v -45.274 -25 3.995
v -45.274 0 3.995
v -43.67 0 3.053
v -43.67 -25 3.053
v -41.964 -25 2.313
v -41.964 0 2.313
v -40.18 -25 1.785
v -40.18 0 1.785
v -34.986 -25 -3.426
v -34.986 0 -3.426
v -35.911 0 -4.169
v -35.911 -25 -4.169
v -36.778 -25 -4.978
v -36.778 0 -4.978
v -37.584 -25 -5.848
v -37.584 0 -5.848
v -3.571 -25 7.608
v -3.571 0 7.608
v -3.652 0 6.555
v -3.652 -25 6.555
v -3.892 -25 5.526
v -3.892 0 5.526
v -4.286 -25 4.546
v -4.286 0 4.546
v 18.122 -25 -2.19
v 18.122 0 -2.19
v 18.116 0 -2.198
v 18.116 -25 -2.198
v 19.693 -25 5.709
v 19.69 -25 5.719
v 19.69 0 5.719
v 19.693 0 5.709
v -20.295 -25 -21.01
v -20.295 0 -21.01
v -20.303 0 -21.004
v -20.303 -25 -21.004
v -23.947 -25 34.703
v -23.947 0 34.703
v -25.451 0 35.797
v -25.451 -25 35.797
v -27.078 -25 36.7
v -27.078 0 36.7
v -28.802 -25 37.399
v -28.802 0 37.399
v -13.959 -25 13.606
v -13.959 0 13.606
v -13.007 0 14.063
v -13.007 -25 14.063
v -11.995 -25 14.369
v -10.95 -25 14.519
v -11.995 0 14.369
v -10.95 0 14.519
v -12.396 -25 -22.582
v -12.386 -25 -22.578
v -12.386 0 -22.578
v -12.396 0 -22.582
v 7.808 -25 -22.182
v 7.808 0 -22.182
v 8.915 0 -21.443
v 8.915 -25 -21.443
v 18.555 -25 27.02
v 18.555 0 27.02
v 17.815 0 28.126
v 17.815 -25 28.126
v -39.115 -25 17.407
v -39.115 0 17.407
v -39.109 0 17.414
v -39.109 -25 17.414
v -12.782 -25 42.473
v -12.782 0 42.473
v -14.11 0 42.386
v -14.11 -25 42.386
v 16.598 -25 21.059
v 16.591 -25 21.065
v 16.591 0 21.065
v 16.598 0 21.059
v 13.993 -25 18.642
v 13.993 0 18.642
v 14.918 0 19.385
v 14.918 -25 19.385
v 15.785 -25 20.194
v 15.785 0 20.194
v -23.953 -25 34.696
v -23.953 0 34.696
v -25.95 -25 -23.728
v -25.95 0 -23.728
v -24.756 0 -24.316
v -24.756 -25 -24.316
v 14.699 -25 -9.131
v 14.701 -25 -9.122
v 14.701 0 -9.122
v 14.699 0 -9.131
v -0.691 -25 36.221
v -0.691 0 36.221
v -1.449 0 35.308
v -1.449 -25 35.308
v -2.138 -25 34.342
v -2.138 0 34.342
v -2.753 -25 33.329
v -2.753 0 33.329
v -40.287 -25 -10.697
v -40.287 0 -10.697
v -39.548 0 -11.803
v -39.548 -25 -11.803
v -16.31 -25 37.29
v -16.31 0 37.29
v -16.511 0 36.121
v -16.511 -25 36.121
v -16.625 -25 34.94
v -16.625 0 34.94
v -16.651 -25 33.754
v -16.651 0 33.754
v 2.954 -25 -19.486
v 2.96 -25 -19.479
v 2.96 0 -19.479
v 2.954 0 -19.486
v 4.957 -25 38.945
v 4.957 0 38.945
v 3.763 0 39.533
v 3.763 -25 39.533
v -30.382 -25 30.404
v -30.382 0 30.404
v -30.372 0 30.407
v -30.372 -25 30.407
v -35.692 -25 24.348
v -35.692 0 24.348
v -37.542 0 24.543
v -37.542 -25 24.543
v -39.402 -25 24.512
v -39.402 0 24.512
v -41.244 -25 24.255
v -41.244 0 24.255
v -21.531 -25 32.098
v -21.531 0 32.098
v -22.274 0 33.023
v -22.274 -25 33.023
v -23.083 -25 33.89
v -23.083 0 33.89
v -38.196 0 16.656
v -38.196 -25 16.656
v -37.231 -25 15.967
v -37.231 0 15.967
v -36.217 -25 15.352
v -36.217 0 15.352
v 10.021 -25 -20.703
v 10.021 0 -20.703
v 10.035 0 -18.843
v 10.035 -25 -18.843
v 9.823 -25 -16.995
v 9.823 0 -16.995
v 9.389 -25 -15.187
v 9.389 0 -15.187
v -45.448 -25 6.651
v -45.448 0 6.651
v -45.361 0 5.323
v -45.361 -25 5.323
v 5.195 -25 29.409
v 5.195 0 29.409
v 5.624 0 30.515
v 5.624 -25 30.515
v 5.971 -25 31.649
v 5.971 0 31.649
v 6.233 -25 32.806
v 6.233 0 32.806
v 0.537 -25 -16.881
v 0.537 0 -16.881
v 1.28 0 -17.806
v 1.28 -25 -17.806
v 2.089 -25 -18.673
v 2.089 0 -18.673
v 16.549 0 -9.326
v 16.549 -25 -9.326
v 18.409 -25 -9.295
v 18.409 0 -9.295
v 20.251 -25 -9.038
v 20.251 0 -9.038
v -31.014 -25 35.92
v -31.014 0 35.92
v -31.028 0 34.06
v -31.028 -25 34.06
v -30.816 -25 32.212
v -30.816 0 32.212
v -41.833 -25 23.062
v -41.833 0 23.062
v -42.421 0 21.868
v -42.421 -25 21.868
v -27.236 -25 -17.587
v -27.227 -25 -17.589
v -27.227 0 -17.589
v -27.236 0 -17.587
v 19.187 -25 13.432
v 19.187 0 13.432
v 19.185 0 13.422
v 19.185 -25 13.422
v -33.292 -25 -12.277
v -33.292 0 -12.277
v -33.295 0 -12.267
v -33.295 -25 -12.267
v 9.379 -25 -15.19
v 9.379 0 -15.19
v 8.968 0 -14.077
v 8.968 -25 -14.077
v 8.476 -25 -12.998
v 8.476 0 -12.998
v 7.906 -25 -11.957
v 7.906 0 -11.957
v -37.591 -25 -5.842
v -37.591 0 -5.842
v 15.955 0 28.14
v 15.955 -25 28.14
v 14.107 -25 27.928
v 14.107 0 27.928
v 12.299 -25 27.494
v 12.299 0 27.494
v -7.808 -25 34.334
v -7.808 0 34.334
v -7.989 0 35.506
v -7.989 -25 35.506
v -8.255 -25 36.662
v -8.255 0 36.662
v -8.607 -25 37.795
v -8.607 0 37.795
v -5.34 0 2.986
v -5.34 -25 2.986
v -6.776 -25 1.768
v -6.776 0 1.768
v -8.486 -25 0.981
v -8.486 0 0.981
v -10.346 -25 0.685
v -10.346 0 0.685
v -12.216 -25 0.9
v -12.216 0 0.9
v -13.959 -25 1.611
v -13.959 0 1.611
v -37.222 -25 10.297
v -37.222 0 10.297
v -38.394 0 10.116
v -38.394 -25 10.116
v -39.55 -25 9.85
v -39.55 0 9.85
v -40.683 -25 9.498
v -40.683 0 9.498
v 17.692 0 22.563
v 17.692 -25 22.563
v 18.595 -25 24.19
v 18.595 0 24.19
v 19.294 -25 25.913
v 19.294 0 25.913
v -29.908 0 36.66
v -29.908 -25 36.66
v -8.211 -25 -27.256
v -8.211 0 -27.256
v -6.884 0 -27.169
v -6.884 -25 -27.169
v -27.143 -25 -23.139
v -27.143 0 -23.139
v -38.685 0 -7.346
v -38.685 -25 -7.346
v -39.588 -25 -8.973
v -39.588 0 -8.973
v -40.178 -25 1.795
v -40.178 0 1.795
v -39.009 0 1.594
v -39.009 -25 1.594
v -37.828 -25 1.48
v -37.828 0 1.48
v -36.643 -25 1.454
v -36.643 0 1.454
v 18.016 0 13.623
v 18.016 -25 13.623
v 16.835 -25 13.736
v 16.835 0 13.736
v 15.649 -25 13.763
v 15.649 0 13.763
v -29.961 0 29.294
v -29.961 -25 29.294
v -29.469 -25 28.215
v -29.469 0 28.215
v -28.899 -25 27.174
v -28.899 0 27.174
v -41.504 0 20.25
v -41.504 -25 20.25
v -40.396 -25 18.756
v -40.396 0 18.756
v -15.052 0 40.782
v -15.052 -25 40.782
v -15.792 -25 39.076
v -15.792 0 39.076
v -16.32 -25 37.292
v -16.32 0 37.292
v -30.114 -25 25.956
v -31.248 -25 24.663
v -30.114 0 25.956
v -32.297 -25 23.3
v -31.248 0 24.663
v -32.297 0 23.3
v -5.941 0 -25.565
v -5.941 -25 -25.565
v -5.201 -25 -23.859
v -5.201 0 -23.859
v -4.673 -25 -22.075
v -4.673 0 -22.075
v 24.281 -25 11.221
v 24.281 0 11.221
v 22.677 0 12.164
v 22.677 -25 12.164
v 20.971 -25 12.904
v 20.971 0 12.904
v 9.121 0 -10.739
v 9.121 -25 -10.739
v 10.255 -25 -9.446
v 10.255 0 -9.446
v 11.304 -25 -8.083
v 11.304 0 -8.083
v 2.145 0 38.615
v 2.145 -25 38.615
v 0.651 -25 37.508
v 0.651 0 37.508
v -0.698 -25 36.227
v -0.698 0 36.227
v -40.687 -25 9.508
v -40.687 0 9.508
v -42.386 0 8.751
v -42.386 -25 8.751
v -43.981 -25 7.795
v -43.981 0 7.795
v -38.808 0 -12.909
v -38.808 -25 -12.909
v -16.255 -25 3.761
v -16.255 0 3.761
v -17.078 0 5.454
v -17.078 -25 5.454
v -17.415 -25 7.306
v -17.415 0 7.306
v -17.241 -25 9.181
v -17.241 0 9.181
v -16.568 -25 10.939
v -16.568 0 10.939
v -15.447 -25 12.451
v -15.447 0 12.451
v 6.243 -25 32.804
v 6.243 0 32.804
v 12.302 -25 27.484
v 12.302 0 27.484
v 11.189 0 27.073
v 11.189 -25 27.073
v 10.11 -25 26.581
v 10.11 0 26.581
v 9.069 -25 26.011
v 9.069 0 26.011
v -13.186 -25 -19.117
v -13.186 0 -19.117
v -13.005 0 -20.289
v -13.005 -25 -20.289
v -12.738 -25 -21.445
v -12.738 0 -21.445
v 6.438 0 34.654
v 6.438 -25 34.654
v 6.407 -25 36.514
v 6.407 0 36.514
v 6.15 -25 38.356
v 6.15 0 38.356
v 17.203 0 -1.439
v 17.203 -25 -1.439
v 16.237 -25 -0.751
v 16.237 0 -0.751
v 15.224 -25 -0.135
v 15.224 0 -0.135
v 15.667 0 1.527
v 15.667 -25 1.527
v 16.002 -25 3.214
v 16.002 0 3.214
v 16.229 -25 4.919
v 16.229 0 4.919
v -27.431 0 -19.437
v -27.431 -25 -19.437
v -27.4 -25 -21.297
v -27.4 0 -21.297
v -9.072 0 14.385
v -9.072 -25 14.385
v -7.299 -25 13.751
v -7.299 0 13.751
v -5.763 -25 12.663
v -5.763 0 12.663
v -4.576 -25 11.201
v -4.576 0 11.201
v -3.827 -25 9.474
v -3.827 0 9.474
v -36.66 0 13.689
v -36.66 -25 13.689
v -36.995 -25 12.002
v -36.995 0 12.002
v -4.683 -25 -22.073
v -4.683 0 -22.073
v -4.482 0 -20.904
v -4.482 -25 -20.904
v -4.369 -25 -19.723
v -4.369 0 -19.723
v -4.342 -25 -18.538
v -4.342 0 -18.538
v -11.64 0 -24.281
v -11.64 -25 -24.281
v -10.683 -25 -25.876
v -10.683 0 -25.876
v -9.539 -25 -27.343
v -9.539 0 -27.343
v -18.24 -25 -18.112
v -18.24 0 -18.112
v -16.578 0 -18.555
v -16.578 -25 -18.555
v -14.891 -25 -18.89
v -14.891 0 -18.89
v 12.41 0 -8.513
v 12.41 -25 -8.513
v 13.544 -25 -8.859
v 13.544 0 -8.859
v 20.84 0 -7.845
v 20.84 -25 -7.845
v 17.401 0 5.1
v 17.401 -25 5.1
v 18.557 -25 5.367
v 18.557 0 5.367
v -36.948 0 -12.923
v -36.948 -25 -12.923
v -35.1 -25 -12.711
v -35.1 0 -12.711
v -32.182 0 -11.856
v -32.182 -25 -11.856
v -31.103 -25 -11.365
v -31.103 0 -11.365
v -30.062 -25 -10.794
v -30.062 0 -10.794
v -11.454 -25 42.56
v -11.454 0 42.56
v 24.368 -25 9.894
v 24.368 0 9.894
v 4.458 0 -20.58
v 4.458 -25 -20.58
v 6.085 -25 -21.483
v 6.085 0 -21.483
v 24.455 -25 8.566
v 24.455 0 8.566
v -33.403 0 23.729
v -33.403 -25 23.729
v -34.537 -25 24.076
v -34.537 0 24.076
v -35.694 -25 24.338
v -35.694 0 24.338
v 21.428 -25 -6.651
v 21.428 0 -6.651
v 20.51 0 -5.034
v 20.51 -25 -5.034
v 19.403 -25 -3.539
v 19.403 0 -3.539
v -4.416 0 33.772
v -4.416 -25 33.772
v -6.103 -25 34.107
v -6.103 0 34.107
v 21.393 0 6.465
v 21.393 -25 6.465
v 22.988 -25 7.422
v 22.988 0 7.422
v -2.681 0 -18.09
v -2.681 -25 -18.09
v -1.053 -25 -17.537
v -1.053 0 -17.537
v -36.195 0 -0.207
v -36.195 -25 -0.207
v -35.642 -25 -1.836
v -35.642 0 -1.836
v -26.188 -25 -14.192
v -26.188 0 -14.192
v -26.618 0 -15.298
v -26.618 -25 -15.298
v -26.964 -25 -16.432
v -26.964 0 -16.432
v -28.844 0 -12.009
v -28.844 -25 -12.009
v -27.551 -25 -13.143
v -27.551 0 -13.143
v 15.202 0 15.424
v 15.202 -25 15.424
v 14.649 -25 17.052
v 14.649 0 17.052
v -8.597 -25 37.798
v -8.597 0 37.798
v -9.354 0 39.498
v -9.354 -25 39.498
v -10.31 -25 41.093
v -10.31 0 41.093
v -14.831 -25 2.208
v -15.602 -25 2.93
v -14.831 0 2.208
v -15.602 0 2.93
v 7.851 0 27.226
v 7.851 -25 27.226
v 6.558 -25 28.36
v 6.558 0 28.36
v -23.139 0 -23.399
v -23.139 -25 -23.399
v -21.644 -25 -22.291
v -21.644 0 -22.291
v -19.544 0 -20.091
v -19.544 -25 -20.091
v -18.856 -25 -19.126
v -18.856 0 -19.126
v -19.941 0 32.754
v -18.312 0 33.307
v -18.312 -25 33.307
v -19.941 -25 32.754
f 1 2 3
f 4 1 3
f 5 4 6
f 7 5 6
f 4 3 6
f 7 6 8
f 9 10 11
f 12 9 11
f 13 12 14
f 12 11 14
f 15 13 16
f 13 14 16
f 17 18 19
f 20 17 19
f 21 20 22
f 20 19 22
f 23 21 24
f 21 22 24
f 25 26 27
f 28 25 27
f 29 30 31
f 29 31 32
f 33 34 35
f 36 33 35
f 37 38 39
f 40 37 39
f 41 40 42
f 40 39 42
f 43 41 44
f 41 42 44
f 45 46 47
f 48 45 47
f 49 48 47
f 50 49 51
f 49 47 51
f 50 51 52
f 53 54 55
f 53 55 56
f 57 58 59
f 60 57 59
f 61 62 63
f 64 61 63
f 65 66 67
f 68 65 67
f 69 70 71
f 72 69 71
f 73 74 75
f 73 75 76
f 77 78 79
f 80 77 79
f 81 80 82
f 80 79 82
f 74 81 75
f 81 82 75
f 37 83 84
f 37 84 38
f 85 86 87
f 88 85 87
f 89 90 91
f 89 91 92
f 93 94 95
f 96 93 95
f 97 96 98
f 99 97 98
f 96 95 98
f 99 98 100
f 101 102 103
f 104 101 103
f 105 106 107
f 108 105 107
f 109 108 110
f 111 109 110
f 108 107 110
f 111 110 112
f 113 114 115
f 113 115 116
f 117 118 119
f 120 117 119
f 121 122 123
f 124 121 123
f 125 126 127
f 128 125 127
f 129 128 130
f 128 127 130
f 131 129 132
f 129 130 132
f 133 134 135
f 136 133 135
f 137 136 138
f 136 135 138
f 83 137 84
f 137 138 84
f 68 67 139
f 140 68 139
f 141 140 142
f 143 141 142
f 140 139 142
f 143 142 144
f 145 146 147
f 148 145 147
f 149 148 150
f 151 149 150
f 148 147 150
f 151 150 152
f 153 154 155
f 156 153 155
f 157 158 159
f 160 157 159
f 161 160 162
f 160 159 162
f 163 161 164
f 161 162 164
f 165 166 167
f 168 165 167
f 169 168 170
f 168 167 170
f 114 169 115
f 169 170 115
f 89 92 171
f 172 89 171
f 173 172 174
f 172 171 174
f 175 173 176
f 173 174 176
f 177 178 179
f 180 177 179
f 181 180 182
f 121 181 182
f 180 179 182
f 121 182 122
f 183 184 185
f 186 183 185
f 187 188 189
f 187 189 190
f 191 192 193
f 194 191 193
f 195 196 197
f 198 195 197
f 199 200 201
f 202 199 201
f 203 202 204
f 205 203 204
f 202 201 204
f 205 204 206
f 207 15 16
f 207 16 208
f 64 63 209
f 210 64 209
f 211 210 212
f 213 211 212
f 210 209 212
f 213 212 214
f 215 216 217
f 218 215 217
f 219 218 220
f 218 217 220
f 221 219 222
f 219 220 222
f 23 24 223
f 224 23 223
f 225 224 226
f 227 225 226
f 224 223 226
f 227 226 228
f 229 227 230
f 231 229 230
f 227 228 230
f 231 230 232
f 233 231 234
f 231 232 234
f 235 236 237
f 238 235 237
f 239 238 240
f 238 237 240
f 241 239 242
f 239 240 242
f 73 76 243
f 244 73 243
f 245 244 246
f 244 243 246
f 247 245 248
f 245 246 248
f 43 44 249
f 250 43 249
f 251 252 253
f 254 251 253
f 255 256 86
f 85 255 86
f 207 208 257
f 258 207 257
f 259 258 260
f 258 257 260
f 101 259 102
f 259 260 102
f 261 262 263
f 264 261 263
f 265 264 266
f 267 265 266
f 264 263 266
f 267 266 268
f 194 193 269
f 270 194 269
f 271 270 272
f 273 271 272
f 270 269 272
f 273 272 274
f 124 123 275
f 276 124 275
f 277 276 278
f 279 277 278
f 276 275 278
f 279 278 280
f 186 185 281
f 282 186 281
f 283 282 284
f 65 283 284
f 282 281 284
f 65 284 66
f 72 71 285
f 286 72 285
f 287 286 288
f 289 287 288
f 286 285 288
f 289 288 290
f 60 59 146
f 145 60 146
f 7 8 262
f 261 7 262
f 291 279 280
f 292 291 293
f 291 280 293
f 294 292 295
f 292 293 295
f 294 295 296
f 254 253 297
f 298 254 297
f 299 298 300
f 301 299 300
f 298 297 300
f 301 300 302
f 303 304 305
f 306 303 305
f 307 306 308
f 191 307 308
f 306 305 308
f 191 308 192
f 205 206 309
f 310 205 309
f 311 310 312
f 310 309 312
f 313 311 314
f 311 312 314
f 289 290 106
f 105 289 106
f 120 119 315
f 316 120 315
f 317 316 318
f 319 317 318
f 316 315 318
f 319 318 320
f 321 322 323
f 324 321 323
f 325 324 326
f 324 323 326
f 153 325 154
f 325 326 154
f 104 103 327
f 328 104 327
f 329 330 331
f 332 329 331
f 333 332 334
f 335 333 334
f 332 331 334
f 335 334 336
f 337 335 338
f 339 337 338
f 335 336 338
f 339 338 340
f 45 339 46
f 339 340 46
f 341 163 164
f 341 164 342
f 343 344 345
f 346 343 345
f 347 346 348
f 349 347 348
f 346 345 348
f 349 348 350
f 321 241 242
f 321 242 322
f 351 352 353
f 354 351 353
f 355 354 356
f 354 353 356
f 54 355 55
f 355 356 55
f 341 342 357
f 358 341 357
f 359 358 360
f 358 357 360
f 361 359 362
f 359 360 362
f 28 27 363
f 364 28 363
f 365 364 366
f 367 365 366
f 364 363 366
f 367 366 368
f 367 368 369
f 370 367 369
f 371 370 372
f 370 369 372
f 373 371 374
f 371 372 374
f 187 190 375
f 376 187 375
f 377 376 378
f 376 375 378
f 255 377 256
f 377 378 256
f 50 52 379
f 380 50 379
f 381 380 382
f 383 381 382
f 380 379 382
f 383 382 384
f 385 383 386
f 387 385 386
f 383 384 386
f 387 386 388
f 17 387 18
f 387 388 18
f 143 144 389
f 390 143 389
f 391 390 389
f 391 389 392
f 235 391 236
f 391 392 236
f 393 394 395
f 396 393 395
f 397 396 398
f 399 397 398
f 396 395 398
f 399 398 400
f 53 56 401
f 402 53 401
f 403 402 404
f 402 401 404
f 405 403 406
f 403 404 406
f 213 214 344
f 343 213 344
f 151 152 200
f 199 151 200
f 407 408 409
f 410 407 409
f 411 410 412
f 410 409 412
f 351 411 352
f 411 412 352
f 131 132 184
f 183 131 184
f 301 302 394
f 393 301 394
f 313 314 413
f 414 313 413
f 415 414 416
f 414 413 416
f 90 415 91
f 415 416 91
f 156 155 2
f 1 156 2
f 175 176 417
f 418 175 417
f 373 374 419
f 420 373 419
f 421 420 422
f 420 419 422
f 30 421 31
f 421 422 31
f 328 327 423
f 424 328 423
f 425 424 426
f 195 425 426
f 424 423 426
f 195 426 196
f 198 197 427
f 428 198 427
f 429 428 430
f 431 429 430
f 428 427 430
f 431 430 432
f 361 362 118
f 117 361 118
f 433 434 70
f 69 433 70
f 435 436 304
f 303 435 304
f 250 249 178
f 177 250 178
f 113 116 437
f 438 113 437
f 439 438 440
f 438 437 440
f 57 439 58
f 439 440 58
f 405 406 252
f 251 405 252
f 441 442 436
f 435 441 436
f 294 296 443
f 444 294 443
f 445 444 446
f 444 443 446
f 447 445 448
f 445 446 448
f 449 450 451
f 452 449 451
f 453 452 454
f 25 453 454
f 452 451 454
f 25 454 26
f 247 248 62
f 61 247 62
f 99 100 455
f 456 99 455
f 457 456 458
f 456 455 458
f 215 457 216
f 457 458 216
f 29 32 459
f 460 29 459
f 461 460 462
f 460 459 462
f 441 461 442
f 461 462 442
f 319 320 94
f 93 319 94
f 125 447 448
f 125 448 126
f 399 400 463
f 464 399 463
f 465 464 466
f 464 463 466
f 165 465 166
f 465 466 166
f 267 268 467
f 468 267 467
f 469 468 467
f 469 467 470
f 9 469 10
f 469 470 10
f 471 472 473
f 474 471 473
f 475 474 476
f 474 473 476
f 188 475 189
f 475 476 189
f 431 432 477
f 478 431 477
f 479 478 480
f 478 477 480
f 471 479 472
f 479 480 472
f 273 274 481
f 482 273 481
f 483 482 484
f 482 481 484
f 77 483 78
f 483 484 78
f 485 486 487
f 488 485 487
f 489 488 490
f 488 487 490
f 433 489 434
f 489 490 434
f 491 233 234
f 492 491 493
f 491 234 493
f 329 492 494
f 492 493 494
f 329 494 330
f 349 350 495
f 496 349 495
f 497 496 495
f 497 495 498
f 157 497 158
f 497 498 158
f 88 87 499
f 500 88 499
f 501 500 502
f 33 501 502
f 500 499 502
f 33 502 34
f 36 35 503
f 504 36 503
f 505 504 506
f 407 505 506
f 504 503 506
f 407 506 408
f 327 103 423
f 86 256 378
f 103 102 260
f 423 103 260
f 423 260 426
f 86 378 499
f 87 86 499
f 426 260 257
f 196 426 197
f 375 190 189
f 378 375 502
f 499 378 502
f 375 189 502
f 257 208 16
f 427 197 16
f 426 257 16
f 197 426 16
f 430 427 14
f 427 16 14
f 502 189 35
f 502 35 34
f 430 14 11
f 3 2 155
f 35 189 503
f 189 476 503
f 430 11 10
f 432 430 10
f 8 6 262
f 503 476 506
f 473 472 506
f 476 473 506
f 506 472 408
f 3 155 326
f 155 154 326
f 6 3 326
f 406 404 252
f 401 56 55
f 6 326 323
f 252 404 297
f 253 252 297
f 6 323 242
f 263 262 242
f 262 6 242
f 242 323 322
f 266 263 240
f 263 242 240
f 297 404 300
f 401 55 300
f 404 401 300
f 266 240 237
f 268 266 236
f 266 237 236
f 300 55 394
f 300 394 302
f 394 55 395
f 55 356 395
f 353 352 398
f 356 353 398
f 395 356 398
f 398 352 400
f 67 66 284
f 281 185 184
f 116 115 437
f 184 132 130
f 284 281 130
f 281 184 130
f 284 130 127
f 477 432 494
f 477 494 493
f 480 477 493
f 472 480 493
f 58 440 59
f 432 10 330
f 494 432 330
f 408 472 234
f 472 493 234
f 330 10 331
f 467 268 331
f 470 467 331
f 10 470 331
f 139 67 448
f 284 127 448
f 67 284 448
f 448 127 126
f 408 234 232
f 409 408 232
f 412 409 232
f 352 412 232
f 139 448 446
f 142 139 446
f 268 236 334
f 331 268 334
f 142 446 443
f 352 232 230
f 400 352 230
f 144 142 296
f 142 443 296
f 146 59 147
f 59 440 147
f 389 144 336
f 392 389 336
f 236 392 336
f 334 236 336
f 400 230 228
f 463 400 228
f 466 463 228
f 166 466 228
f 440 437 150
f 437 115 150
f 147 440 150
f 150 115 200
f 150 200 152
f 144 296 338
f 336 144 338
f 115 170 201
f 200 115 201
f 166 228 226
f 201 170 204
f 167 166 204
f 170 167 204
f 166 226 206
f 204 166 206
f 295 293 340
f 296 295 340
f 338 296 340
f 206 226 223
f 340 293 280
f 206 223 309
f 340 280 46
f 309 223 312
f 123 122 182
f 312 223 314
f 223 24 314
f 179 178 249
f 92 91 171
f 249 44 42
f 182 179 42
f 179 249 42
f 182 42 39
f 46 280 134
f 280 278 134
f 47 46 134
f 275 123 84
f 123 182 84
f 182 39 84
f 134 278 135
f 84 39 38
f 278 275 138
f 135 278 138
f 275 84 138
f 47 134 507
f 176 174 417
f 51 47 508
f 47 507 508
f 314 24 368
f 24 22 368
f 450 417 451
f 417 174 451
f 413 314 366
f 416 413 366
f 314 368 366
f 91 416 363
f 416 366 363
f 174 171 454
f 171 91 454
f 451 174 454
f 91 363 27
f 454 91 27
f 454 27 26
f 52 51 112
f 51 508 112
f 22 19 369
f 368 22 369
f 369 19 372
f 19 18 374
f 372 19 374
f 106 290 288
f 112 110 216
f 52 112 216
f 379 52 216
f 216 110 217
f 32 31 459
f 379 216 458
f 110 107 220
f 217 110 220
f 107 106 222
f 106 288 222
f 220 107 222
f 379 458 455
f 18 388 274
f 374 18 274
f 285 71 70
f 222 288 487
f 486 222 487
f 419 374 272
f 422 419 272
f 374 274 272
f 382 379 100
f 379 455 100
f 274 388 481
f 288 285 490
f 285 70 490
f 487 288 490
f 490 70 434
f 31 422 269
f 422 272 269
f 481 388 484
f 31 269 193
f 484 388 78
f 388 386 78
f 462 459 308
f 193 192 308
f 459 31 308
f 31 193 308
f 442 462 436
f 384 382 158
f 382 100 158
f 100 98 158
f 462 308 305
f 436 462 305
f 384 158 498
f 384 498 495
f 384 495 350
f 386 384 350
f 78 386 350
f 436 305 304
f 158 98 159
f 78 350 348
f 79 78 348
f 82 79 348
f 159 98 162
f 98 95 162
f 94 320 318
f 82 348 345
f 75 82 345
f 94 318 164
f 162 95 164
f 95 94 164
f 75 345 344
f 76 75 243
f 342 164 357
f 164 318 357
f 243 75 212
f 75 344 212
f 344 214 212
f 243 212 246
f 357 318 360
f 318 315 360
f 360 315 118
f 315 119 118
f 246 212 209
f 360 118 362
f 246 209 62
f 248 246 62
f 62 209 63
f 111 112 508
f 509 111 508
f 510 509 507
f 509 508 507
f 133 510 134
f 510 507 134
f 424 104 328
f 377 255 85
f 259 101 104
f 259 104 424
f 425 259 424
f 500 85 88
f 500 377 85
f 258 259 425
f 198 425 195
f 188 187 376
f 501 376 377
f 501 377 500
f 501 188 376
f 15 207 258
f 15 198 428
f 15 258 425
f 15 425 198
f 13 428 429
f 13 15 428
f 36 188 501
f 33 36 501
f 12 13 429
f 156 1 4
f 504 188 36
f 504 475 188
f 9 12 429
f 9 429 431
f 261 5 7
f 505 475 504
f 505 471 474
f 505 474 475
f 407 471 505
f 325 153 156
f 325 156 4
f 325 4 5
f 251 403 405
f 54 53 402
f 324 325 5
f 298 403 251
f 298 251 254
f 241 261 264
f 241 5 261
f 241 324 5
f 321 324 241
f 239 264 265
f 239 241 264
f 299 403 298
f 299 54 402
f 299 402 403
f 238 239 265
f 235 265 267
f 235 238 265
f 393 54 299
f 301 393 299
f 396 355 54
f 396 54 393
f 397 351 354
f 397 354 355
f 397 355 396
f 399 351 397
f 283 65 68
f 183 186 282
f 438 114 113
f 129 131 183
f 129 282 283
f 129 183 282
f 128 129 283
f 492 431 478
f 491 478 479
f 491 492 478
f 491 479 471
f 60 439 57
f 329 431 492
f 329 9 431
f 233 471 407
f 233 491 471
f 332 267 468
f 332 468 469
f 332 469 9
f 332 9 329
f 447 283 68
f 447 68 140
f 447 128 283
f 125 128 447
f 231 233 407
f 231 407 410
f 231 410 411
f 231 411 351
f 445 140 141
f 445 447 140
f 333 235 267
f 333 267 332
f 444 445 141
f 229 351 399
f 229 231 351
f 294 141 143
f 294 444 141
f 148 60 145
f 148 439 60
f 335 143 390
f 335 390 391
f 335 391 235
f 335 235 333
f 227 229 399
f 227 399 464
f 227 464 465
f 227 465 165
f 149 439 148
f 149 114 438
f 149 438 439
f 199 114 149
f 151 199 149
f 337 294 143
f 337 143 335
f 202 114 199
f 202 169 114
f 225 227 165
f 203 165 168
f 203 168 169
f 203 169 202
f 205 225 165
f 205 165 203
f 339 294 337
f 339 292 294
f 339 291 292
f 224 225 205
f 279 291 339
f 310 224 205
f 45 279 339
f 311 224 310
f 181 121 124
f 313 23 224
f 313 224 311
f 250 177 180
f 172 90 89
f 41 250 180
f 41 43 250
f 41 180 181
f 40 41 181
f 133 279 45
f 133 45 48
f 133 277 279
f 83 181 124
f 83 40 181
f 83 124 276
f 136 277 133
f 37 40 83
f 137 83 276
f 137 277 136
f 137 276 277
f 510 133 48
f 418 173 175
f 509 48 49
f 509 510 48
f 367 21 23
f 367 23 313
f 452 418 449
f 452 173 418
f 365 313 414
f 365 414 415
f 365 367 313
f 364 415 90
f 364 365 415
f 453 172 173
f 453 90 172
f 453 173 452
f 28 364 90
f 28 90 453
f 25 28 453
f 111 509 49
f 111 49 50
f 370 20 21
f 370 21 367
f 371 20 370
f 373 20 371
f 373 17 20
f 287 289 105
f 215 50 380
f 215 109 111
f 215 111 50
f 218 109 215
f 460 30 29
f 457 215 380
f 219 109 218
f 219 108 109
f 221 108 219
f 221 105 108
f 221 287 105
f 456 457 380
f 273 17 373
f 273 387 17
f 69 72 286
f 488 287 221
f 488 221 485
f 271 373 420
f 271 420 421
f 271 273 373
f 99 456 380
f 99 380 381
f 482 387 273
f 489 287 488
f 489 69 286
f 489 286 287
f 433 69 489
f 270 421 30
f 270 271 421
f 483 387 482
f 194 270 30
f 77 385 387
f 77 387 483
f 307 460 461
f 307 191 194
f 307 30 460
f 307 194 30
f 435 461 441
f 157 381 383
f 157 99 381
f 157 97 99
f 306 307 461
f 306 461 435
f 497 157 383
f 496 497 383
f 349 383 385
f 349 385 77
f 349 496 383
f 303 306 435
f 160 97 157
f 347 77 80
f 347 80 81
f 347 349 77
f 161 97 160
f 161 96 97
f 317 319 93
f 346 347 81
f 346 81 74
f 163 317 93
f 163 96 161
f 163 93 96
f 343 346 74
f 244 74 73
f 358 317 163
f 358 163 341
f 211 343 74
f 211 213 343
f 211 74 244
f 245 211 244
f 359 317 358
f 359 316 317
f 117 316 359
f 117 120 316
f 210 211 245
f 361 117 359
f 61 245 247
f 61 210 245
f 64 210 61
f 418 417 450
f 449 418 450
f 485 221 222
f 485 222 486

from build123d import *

# Parameters (mm, degrees)
F1_DEPTH = 25
F2_COUNT = 12


with BuildPart() as f1:
    # F0 (on Front) → F1 (new body)
    with BuildSketch(Plane.XZ):
        with BuildLine():
            ThreePointArc((-16.6509747505, 33.7543450296), (-27.1725581608, -13.448613953), (16.3639183414, 7.6084102419))
            ThreePointArc((16.3639183414, 7.6084102419), (9.424696785, 25.625877473), (-7.8075695626, 34.3339724287))
            ThreePointArc((-7.8075695626, 34.3339724287), (-10.0288510811, 34.4648375612), (-12.2533424113, 34.4113998496))
            ThreePointArc((-12.2533424113, 34.4113998496), (-14.4657779308, 34.1740260113), (-16.6509747505, 33.7543450296))
        make_face()
        with BuildLine():
            ThreePointArc((11.4594258414, 7.6084102419), (-25.5055393688, -8.4164908122), (-11.9325732545, 29.5174082445))
            ThreePointArc((-11.9325732545, 29.5174082445), (4.5123760516, 23.6333112961), (11.4594258414, 7.6084102419))
        make_face(mode=Mode.SUBTRACT)
        with BuildLine():
            ThreePointArc((11.4594258414, 7.6084102419), (4.5123760516, 23.6333112961), (-11.9325732545, 29.5174082445))
            ThreePointArc((-11.9325732545, 29.5174082445), (-25.5055393688, -8.4164908122), (11.4594258414, 7.6084102419))
        make_face()
        with BuildLine():
            ThreePointArc((-3.5714667078, 7.6084102419), (-15.2305369296, 2.5540176401), (-10.9495058467, 14.51869799))
            ThreePointArc((-10.9495058467, 14.51869799), (-5.7626263876, 12.6628028438), (-3.5714667078, 7.6084102419))
        make_face(mode=Mode.SUBTRACT)
        with BuildLine():
            ThreePointArc((-16.3103613436, 37.2902214427), (-16.5785686452, 35.5317140681), (-16.6509747505, 33.7543450296))
            ThreePointArc((-16.6509747505, 33.7543450296), (-14.4657779308, 34.1740260113), (-12.2533424113, 34.4113998496))
            Line((-12.2533424113, 34.4113998496), (-12.5728145113, 39.2856021927))
            Line((-12.5728145113, 39.2856021927), (-12.7817342645, 42.4731016662))
            Line((-12.7817342645, 42.4731016662), (-14.1095504339, 42.3860719965))
            ThreePointArc((-14.1095504339, 42.3860719965), (-15.4479467452, 39.9403396391), (-16.3200243922, 37.2922474905))
            Line((-16.3200243922, 37.2922474905), (-16.3103613436, 37.2902214427))
        make_face()
        with BuildLine():
            ThreePointArc((-12.2533424113, 34.4113998496), (-10.0288510811, 34.4648375612), (-7.8075695626, 34.3339724287))
            ThreePointArc((-7.8075695626, 34.3339724287), (-8.1113494364, 36.0866849355), (-8.606793459, 37.7951399579))
            Line((-8.606793459, 37.7951399579), (-8.5974775314, 37.7984099535))
            ThreePointArc((-8.5974775314, 37.7984099535), (-9.807739818, 40.3100183321), (-11.4539180952, 42.5601313359))
            Line((-11.4539180952, 42.5601313359), (-12.7817342645, 42.4731016662))
            Line((-12.7817342645, 42.4731016662), (-12.5728145113, 39.2856021927))
            Line((-12.5728145113, 39.2856021927), (-12.2533424113, 34.4113998496))
        make_face()
    extrude(amount=F1_DEPTH)

    # F2: F1 ×12 about axis
    f2_axis = Axis((-10.4965816586, 0, 7.6084102419), (0, 1, 0))


with BuildPart() as f1_1:
    add(f1.part)
    for i in range(1, F2_COUNT):
        add(f1.part.rotate(f2_axis, i * 360 / F2_COUNT))


solid = f1_1.part
